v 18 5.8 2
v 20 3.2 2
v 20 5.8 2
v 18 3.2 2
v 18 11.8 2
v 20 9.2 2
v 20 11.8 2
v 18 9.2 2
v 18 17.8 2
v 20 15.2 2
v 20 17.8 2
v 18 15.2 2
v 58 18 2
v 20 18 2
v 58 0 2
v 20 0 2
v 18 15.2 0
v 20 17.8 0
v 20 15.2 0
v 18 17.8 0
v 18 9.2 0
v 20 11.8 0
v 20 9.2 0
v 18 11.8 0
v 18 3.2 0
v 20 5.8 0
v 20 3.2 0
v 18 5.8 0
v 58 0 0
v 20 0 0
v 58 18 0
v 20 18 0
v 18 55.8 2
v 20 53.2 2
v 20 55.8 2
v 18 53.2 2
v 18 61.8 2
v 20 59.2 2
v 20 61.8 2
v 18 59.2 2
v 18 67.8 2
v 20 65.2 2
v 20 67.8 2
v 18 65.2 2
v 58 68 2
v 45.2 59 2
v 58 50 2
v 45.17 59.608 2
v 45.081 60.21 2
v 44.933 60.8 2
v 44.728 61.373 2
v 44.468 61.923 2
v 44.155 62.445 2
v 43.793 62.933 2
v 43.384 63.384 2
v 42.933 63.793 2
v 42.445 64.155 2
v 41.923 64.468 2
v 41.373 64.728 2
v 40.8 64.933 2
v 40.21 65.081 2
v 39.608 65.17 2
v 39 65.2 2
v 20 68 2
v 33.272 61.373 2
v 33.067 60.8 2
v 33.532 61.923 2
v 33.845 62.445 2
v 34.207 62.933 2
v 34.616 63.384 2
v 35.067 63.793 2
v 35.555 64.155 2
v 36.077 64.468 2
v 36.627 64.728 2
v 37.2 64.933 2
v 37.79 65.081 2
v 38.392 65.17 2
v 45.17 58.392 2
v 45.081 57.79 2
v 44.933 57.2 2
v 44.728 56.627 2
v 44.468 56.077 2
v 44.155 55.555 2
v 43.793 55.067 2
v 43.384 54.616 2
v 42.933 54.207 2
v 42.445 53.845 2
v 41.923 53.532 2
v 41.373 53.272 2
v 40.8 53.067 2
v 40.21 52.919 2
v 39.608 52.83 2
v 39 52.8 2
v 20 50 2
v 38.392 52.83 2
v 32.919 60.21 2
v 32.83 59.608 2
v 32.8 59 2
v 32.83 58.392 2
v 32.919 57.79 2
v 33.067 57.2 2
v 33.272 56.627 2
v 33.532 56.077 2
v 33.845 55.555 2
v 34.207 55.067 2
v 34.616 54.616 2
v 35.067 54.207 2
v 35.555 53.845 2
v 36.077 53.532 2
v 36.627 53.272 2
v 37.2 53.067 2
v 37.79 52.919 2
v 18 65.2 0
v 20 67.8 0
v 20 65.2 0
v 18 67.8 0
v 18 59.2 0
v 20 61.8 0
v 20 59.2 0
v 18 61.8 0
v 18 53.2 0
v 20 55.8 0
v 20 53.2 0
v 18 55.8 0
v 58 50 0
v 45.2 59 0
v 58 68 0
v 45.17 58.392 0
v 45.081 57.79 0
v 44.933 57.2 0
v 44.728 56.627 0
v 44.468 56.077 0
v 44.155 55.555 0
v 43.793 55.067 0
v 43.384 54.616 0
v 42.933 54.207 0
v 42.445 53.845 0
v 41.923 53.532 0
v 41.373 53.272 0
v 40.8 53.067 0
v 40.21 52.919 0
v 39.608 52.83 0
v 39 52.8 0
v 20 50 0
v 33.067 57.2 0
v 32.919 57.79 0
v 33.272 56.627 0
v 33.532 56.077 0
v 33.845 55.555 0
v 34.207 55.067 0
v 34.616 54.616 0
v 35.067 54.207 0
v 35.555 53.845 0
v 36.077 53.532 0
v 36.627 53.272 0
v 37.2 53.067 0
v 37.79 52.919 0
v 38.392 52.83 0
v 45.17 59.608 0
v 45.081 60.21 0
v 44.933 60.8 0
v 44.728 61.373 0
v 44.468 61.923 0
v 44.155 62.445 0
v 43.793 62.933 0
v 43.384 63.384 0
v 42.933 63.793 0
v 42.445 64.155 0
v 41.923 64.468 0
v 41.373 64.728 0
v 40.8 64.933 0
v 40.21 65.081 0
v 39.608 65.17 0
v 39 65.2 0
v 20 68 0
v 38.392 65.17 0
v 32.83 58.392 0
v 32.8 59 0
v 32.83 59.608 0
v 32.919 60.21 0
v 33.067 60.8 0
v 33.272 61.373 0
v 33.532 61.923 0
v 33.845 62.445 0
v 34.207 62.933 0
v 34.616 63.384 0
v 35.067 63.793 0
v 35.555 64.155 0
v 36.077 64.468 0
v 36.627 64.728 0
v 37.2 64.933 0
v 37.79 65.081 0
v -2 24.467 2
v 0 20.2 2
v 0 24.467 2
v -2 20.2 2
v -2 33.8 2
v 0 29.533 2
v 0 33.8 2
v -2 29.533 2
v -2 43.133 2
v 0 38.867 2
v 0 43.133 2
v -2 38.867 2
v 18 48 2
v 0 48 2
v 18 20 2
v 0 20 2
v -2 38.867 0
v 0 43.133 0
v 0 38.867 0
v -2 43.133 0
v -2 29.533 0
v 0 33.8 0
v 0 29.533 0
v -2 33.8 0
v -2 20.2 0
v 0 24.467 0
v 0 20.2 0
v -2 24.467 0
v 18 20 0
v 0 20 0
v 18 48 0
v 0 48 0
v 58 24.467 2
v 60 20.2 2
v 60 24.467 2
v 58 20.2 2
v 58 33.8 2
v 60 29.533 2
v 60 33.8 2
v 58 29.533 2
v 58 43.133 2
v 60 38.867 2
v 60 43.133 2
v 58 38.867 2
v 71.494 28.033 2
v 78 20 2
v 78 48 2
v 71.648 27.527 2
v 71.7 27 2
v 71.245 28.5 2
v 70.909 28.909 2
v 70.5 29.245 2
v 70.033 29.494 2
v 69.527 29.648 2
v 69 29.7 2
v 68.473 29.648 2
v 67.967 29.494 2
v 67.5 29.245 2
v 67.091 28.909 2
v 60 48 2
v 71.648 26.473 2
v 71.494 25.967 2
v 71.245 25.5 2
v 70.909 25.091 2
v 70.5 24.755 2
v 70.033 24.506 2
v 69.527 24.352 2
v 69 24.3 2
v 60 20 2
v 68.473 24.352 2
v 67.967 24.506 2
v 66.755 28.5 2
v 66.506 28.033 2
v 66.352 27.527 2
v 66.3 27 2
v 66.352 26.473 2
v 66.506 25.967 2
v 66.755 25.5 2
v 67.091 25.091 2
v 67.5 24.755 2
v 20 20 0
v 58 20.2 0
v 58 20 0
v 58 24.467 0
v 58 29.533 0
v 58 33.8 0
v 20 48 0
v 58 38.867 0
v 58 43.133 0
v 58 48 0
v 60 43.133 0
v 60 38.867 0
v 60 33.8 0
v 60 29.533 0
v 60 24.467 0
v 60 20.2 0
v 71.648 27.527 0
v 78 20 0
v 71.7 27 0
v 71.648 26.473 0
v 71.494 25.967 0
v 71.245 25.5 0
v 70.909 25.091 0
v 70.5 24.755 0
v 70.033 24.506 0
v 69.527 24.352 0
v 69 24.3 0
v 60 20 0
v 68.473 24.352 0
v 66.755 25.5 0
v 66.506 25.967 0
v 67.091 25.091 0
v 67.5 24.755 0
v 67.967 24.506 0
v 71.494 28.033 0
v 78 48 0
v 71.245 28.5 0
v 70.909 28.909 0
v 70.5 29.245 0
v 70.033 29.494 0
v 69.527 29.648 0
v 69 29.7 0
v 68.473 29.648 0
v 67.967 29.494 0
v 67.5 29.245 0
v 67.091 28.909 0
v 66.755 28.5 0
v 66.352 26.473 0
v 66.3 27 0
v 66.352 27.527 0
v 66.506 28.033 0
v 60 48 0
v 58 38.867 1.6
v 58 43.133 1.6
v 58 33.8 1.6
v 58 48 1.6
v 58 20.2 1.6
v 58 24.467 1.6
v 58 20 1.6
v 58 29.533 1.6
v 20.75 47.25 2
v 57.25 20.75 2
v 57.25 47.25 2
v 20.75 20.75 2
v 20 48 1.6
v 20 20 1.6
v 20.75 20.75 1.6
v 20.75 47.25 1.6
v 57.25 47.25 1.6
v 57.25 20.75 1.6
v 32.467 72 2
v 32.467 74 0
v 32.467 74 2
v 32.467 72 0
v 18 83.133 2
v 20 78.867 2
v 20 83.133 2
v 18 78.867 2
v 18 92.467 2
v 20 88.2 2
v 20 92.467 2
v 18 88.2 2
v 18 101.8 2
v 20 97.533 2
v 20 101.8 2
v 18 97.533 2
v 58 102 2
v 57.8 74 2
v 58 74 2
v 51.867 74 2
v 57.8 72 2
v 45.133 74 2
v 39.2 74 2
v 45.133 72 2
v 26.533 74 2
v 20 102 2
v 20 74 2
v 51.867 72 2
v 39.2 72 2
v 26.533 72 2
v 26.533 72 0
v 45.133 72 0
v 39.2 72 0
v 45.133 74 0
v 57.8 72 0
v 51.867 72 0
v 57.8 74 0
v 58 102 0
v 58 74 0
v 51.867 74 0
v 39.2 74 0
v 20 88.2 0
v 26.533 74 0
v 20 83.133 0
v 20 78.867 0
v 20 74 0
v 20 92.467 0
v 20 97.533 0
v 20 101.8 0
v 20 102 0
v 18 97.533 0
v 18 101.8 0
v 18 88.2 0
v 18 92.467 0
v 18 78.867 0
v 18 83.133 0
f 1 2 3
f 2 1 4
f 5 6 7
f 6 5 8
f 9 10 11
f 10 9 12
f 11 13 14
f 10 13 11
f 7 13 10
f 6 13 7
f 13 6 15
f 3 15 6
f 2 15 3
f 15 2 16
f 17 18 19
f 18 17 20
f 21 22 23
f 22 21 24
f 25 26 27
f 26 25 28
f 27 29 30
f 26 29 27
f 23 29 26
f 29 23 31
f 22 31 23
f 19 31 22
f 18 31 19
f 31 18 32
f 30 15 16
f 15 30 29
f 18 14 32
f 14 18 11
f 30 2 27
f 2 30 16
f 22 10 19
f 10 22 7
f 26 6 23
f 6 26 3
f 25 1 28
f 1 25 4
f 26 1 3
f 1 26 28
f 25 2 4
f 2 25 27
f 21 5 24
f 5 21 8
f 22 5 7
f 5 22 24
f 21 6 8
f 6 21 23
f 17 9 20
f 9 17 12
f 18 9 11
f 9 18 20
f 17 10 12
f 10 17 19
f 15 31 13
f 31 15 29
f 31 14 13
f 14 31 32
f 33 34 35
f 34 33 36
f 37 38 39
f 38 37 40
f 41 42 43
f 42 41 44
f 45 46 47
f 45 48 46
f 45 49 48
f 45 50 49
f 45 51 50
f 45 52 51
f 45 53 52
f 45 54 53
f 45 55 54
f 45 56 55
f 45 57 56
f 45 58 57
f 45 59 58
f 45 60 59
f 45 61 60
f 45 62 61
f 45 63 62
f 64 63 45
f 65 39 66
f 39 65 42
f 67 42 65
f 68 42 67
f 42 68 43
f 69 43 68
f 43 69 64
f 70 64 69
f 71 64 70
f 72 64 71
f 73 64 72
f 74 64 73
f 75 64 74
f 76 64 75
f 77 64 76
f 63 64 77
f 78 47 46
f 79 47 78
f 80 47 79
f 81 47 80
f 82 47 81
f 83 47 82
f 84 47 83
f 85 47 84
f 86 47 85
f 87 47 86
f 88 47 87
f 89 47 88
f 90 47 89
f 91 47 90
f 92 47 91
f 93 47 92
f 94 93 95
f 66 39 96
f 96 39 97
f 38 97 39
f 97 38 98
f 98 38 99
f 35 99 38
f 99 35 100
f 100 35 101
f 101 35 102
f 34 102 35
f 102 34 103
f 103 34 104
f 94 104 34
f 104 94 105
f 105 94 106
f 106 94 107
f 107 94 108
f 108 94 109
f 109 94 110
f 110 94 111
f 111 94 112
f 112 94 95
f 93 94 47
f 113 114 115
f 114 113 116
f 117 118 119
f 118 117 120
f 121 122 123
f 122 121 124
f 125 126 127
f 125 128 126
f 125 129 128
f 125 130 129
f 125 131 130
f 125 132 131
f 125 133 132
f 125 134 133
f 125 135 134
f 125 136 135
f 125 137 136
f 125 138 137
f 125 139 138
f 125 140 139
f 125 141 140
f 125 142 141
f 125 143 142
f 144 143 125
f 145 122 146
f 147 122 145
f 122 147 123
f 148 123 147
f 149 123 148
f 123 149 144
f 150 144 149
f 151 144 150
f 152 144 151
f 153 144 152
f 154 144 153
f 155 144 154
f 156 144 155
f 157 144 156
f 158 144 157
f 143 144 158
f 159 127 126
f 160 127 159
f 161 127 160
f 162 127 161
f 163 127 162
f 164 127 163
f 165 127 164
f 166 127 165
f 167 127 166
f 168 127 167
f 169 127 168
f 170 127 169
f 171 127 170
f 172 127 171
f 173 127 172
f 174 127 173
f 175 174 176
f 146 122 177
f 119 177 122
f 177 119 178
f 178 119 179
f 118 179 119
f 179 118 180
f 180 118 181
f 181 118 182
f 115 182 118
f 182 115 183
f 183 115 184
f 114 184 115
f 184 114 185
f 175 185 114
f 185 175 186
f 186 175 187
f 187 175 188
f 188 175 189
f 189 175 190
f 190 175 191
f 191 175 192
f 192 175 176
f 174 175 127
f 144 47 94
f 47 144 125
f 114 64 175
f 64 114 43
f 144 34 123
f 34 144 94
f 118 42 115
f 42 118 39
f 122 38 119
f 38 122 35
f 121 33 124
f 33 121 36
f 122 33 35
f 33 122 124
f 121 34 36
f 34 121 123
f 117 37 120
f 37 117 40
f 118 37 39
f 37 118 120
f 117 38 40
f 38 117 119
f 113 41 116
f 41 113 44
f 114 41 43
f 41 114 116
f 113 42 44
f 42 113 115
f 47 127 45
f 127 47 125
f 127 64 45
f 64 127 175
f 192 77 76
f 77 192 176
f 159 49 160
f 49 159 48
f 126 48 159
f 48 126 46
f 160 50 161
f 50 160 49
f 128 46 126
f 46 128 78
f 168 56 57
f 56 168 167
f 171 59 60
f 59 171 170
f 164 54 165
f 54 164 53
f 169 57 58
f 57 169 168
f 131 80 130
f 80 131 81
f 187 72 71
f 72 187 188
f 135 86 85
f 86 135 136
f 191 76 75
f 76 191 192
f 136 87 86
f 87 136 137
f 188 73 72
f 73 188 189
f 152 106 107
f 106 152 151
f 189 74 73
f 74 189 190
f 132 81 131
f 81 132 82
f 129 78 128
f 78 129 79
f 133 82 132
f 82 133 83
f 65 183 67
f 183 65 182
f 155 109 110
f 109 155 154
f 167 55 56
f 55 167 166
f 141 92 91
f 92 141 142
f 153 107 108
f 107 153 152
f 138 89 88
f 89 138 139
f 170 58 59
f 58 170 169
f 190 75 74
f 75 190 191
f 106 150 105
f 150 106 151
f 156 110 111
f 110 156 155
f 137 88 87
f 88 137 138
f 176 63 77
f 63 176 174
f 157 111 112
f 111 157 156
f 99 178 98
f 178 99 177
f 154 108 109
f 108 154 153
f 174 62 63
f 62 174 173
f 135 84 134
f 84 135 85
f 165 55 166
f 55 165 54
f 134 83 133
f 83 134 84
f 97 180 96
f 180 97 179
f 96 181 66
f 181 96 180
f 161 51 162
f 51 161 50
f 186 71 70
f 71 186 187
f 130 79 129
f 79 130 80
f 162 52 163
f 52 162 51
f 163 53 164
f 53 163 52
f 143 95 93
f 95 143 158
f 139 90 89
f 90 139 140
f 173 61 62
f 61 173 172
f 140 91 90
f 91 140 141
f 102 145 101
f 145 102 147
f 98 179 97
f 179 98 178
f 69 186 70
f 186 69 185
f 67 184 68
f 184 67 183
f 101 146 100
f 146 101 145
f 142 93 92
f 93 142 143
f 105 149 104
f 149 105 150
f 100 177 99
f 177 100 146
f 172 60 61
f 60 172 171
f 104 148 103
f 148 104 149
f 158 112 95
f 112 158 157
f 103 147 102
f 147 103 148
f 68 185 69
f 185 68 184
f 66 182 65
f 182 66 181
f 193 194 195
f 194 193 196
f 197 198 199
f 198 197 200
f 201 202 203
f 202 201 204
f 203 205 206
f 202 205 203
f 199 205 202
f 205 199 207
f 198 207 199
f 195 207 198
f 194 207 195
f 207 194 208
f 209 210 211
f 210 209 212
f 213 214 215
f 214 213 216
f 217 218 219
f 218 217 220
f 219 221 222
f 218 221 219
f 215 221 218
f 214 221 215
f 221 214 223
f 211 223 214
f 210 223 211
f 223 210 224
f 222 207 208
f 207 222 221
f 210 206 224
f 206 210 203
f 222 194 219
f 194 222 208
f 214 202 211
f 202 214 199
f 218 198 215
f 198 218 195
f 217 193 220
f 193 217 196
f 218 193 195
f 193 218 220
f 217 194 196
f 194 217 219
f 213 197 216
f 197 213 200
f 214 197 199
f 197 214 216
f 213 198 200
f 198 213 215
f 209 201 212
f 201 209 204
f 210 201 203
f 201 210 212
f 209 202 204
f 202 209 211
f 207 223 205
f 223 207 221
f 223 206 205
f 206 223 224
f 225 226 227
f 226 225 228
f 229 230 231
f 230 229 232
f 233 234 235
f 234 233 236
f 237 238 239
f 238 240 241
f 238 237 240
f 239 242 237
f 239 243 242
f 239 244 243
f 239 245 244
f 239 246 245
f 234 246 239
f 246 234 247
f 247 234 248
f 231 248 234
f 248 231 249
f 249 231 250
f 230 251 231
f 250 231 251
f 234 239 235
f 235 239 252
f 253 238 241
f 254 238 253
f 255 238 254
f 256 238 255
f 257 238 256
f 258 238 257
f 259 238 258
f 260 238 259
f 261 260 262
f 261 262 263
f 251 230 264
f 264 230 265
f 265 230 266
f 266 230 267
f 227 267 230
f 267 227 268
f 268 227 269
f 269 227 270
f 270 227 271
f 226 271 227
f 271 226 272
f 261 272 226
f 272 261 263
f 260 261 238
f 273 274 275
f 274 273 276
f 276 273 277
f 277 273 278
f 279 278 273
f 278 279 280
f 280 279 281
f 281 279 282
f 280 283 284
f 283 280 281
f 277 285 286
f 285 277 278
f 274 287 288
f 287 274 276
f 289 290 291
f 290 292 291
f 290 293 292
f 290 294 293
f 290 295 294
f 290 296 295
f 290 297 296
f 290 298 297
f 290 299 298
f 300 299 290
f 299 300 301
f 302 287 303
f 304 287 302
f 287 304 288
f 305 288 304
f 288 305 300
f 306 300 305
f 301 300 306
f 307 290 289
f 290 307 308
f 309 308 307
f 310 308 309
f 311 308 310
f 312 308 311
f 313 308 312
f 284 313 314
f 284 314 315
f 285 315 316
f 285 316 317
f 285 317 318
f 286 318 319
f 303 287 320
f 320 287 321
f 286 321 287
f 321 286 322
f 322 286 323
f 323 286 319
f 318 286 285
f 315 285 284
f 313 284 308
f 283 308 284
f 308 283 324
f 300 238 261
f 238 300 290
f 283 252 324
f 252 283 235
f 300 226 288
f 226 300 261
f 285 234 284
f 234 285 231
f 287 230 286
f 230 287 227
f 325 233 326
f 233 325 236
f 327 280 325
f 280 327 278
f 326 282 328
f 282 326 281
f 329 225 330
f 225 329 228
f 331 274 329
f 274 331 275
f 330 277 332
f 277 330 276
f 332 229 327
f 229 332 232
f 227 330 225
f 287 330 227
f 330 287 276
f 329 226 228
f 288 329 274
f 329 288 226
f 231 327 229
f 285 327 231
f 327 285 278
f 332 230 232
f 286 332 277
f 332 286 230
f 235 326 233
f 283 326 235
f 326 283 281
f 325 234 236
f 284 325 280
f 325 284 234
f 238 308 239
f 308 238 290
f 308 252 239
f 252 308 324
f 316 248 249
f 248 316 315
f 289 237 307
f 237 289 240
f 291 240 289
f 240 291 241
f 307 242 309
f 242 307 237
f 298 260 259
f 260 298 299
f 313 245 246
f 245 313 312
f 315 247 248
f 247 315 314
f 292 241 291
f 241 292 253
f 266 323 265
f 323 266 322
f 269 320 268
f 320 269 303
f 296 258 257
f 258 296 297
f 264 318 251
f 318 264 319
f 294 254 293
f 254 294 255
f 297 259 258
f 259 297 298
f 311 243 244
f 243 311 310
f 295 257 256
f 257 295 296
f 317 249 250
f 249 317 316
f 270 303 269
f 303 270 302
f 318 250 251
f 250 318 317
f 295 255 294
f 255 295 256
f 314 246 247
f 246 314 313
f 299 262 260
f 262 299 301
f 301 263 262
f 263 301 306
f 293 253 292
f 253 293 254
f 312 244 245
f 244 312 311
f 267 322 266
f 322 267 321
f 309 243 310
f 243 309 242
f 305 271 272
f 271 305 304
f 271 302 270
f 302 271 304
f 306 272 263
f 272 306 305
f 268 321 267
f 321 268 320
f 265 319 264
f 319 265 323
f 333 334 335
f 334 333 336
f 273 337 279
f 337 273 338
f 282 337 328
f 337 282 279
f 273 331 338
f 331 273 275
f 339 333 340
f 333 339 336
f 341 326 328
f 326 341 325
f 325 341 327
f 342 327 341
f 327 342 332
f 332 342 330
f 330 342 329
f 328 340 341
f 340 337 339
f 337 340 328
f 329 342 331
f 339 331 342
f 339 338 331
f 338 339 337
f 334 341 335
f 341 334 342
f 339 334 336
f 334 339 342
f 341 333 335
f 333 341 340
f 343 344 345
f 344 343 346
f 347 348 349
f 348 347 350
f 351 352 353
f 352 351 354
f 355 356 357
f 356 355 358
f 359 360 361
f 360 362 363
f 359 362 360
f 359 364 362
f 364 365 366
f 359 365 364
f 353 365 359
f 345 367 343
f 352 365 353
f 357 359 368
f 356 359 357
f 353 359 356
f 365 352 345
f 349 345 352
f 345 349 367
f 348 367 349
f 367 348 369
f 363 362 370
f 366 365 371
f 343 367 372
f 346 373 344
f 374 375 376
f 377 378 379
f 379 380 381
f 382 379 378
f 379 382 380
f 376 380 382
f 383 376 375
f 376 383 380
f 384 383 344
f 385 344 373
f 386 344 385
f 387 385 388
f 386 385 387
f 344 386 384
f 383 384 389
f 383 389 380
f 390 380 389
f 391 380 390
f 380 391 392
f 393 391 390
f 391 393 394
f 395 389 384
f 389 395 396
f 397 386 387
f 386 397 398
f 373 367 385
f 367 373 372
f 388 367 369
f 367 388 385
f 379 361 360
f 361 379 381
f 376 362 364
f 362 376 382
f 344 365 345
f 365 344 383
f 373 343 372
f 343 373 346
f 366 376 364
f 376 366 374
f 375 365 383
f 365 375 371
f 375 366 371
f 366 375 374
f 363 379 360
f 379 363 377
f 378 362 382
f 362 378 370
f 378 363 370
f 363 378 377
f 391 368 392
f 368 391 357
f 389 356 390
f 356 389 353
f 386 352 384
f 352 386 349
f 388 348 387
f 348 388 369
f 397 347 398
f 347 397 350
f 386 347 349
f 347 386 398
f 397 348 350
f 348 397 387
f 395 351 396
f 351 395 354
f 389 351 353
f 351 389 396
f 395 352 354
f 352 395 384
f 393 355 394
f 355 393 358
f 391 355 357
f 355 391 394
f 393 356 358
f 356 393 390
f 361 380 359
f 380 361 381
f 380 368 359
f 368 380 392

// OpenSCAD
// Made by Claude. I, Richel, think it is quite a bad design :-/
//
// ============================================================
// Piezo casing — foldable flat-pack with living hinges
// ============================================================
//
// Layout (flat):
//
//              [3 top/lid]
//                  |
//       [2 left]--[1 bottom]--[4 right]
//                  |               |
//              [5 front]       (cable hole)
//                  |
//              [6 back — piezo hole]
//
// Panels 1,2,4,5,6 are connected via living hinges (thin flex lines).
// Panel 3 (lid) is a separate piece with finger joints on all 4 edges.
// Panels 2 and 4 also have finger joints on their free top edge
// so they lock to the lid.
//
// Assembly:
//   1. Glue piezo disc into panel 6 (back) while flat — full access.
//   2. Fold 2, 4, 5, 6 up 90° along hinge lines.
//   3. The corner finger joints of 2/4 with 5/6 interlock.
//   4. Thread cable through hole in panel 4, glue panel 4 corner joints.
//   5. Drop lid (panel 3) onto the open top, press finger joints home.
//
// ============================================================

// === Parameters ===
outer_width    = 40;   // X dimension of assembled box
outer_depth    = 30;   // Y dimension
outer_height   = 20;   // Z dimension
wall_t         = 2;    // wall thickness

// Living hinge
hinge_t        = 0.4;  // thickness of flex zone (fraction of wall_t)
hinge_w        = 1.5;  // width of the flex zone along the fold line

// Finger joints
n_teeth        = 6;    // number of teeth per edge (keep even)
teeth_air      = 0.2;  // clearance per side

// Cutouts
piezo_d        = 12;
cable_d        = 5;

// Layout spacing (only between panel 3 and the cross)
spacing        = 4;

// Derived
iw = outer_width  - wall_t;
id = outer_depth  - wall_t;
ih = outer_height - wall_t;

// ============================================================
// MODULES
// ============================================================

// --- Finger teeth along an edge ---
// axis: "x" = teeth point in X dir (along a Y-length edge)
//       "y" = teeth point in Y dir (along an X-length edge)
// side: which side the teeth stick out toward (+1 or -1)
// length: length of the edge
// offset_parity: 0=teeth on even slots, 1=teeth on odd slots
//   (use opposite parities on mating edges so they interlock)

module teeth_x(length, side, parity) {
    // teeth stick out in X, edge runs in Y
    t = length / n_teeth;
    for (i = [0 : n_teeth - 1]) {
        if ((i % 2) == parity)
            translate([
                side > 0 ? 0 : -wall_t,
                i * t + teeth_air,
                0
            ])
            cube([wall_t, t - 2*teeth_air, wall_t]);
    }
}

module teeth_y(length, side, parity) {
    // teeth stick out in Y, edge runs in X
    t = length / n_teeth;
    for (i = [0 : n_teeth - 1]) {
        if ((i % 2) == parity)
            translate([
                i * t + teeth_air,
                side > 0 ? 0 : -wall_t,
                0
            ])
            cube([t - 2*teeth_air, wall_t, wall_t]);
    }
}

// --- Living hinge line ---
// Creates a thin groove across the full width of the panel
// so it can fold. Groove is cut from the top surface.
// dir: "x" = groove runs in X (fold along X axis)
//      "y" = groove runs in Y
// panel_w, panel_d: panel extents in X and Y
// pos: position of hinge along the other axis
module hinge_groove_x(panel_w, pos) {
    translate([0, pos - hinge_w/2, wall_t - hinge_t])
        cube([panel_w, hinge_w, hinge_t + 0.01]);
}
module hinge_groove_y(panel_d, pos) {
    translate([pos - hinge_w/2, 0, wall_t - hinge_t])
        cube([hinge_w, panel_d, hinge_t + 0.01]);
}

// ============================================================
// PANEL 1 — bottom (iw × id)
// Hinges to: 2 (left edge, x=0), 4 (right edge, x=iw),
//            5 (front edge, y=0), 6 (back edge, y=id)
// No finger joints on its own edges (hinge takes care of it).
// ============================================================
module panel_bottom() {
    difference() {
        cube([iw, id, wall_t]);
        // living hinges
        hinge_groove_y(id, 0);          // left edge hinge
        hinge_groove_y(id, iw);         // right edge hinge
        hinge_groove_x(iw, 0);          // front edge hinge
        hinge_groove_x(iw, id);         // back edge hinge
    }
}

// ============================================================
// PANEL 2 — left side (ih × id), attached to panel 1 left edge
// Free top edge: finger joints (locks to lid)
// Left/right edges: become corners — finger joints with 5 and 6
// Bottom edge: hinge (already on panel 1)
// ============================================================
module panel_left() {
    union() {
        difference() {
            cube([ih, id, wall_t]);
            // No grooves needed here — hinge is on panel 1
        }
        // Top edge teeth (mate with lid panel 3, parity 0)
        teeth_y(ih, +1, 0);
        // Left edge teeth (mate with panel 5 front, parity 0)
        teeth_x(id, -1, 0);
        // Right edge teeth (mate with panel 6 back, parity 0)
        teeth_x(id, +1, 0);
    }
}

// ============================================================
// PANEL 4 — right side (ih × id), attached to panel 1 right edge
// Cable hole centred in the panel (easy to route wire before closing lid)
// Free top edge: finger joints (locks to lid)
// Left/right edges: finger joints with 5 and 6
// ============================================================
module panel_right() {
    difference() {
        union() {
            cube([ih, id, wall_t]);
            // Top edge teeth (mate with lid, parity 0)
            teeth_y(ih, +1, 0);
            // Left edge (mates with panel 5)
            teeth_x(id, -1, 0);
            // Right edge (mates with panel 6)
            teeth_x(id, +1, 0);
        }
        // Cable hole — centred, near the bottom of the assembled wall
        // (bottom = the hinge side = y=0 in flat layout)
        translate([ih/2, id * 0.25, -1])
            cylinder(h=wall_t+2, r=cable_d/2 + teeth_air, $fn=32);
    }
}

// ============================================================
// PANEL 5 — front (iw × ih), attached to panel 1 front edge
// Left/right edges: finger joints with 2 and 4 (parity 1, mates 0)
// Top edge: finger joints with lid (parity 0)
// Bottom edge: hinge (on panel 1)
// ============================================================
module panel_front() {
    union() {
        cube([iw, ih, wall_t]);
        // Top edge (mates with lid, parity 0)
        teeth_y(iw, +1, 0);
        // Left edge (mates with panel 2 right side, parity 1 → interlocks with parity 0)
        teeth_x(ih, -1, 1);
        // Right edge (mates with panel 4 left side, parity 1)
        teeth_x(ih, +1, 1);
    }
}

// ============================================================
// PANEL 6 — back (iw × ih), attached to panel 1 back edge
// Piezo hole: centred, full access while flat
// Left/right edges: finger joints with 2 and 4 (parity 1)
// Top edge: finger joints with lid (parity 0)
// ============================================================
module panel_back() {
    difference() {
        union() {
            cube([iw, ih, wall_t]);
            // Top edge (mates with lid, parity 0)
            teeth_y(iw, +1, 0);
            // Left edge (mates with panel 2, parity 1)
            teeth_x(ih, -1, 1);
            // Right edge (mates with panel 4, parity 1)
            teeth_x(ih, +1, 1);
        }
        // Piezo hole — centred in the panel
        translate([iw/2, ih/2, -1])
            cylinder(h=wall_t+2, r=piezo_d/2 + teeth_air, $fn=64);
    }
}

// ============================================================
// PANEL 3 — lid (iw × id), separate piece
// All 4 edges have finger joints (parity 1, mates parity 0 on walls)
// ============================================================
module panel_lid() {
    union() {
        cube([iw, id, wall_t]);
        // All four edges, parity 1 (mates with parity 0 on walls)
        teeth_y(iw, -1, 1);           // front edge (mates panel 5)
        teeth_y(iw, +1, 1);           // back edge  (mates panel 6)
        teeth_x(id, -1, 1);           // left edge  (mates panel 2)
        teeth_x(id, +1, 1);           // right edge (mates panel 4)
    }
}

// ============================================================
// FLAT LAYOUT
//
//     [3 lid]   — above the cross, with spacing
//
//         [6 back ]
//  [2 L]  [1 botm ]  [4 R]
//         [5 front]
//
// ============================================================

// Panel 1 origin (centre of cross)
p1x = ih + wall_t;   // leave room for panel 2 to the left
p1y = ih + wall_t;   // leave room for panel 5 below

// Panel 5 (front) — below panel 1
translate([p1x, p1y - ih - wall_t, 0])  panel_front();

// Panel 6 (back) — above panel 1
translate([p1x, p1y + id + wall_t, 0])  panel_back();

// Panel 2 (left) — left of panel 1
translate([p1x - ih - wall_t, p1y, 0])  panel_left();

// Panel 4 (right) — right of panel 1
translate([p1x + iw + wall_t, p1y, 0])  panel_right();

// Panel 1 (bottom)
translate([p1x, p1y, 0])  panel_bottom();

// Panel 3 (lid) — separate, above with spacing
translate([p1x, p1y + id + ih + wall_t*2 + spacing, 0])  panel_lid();
